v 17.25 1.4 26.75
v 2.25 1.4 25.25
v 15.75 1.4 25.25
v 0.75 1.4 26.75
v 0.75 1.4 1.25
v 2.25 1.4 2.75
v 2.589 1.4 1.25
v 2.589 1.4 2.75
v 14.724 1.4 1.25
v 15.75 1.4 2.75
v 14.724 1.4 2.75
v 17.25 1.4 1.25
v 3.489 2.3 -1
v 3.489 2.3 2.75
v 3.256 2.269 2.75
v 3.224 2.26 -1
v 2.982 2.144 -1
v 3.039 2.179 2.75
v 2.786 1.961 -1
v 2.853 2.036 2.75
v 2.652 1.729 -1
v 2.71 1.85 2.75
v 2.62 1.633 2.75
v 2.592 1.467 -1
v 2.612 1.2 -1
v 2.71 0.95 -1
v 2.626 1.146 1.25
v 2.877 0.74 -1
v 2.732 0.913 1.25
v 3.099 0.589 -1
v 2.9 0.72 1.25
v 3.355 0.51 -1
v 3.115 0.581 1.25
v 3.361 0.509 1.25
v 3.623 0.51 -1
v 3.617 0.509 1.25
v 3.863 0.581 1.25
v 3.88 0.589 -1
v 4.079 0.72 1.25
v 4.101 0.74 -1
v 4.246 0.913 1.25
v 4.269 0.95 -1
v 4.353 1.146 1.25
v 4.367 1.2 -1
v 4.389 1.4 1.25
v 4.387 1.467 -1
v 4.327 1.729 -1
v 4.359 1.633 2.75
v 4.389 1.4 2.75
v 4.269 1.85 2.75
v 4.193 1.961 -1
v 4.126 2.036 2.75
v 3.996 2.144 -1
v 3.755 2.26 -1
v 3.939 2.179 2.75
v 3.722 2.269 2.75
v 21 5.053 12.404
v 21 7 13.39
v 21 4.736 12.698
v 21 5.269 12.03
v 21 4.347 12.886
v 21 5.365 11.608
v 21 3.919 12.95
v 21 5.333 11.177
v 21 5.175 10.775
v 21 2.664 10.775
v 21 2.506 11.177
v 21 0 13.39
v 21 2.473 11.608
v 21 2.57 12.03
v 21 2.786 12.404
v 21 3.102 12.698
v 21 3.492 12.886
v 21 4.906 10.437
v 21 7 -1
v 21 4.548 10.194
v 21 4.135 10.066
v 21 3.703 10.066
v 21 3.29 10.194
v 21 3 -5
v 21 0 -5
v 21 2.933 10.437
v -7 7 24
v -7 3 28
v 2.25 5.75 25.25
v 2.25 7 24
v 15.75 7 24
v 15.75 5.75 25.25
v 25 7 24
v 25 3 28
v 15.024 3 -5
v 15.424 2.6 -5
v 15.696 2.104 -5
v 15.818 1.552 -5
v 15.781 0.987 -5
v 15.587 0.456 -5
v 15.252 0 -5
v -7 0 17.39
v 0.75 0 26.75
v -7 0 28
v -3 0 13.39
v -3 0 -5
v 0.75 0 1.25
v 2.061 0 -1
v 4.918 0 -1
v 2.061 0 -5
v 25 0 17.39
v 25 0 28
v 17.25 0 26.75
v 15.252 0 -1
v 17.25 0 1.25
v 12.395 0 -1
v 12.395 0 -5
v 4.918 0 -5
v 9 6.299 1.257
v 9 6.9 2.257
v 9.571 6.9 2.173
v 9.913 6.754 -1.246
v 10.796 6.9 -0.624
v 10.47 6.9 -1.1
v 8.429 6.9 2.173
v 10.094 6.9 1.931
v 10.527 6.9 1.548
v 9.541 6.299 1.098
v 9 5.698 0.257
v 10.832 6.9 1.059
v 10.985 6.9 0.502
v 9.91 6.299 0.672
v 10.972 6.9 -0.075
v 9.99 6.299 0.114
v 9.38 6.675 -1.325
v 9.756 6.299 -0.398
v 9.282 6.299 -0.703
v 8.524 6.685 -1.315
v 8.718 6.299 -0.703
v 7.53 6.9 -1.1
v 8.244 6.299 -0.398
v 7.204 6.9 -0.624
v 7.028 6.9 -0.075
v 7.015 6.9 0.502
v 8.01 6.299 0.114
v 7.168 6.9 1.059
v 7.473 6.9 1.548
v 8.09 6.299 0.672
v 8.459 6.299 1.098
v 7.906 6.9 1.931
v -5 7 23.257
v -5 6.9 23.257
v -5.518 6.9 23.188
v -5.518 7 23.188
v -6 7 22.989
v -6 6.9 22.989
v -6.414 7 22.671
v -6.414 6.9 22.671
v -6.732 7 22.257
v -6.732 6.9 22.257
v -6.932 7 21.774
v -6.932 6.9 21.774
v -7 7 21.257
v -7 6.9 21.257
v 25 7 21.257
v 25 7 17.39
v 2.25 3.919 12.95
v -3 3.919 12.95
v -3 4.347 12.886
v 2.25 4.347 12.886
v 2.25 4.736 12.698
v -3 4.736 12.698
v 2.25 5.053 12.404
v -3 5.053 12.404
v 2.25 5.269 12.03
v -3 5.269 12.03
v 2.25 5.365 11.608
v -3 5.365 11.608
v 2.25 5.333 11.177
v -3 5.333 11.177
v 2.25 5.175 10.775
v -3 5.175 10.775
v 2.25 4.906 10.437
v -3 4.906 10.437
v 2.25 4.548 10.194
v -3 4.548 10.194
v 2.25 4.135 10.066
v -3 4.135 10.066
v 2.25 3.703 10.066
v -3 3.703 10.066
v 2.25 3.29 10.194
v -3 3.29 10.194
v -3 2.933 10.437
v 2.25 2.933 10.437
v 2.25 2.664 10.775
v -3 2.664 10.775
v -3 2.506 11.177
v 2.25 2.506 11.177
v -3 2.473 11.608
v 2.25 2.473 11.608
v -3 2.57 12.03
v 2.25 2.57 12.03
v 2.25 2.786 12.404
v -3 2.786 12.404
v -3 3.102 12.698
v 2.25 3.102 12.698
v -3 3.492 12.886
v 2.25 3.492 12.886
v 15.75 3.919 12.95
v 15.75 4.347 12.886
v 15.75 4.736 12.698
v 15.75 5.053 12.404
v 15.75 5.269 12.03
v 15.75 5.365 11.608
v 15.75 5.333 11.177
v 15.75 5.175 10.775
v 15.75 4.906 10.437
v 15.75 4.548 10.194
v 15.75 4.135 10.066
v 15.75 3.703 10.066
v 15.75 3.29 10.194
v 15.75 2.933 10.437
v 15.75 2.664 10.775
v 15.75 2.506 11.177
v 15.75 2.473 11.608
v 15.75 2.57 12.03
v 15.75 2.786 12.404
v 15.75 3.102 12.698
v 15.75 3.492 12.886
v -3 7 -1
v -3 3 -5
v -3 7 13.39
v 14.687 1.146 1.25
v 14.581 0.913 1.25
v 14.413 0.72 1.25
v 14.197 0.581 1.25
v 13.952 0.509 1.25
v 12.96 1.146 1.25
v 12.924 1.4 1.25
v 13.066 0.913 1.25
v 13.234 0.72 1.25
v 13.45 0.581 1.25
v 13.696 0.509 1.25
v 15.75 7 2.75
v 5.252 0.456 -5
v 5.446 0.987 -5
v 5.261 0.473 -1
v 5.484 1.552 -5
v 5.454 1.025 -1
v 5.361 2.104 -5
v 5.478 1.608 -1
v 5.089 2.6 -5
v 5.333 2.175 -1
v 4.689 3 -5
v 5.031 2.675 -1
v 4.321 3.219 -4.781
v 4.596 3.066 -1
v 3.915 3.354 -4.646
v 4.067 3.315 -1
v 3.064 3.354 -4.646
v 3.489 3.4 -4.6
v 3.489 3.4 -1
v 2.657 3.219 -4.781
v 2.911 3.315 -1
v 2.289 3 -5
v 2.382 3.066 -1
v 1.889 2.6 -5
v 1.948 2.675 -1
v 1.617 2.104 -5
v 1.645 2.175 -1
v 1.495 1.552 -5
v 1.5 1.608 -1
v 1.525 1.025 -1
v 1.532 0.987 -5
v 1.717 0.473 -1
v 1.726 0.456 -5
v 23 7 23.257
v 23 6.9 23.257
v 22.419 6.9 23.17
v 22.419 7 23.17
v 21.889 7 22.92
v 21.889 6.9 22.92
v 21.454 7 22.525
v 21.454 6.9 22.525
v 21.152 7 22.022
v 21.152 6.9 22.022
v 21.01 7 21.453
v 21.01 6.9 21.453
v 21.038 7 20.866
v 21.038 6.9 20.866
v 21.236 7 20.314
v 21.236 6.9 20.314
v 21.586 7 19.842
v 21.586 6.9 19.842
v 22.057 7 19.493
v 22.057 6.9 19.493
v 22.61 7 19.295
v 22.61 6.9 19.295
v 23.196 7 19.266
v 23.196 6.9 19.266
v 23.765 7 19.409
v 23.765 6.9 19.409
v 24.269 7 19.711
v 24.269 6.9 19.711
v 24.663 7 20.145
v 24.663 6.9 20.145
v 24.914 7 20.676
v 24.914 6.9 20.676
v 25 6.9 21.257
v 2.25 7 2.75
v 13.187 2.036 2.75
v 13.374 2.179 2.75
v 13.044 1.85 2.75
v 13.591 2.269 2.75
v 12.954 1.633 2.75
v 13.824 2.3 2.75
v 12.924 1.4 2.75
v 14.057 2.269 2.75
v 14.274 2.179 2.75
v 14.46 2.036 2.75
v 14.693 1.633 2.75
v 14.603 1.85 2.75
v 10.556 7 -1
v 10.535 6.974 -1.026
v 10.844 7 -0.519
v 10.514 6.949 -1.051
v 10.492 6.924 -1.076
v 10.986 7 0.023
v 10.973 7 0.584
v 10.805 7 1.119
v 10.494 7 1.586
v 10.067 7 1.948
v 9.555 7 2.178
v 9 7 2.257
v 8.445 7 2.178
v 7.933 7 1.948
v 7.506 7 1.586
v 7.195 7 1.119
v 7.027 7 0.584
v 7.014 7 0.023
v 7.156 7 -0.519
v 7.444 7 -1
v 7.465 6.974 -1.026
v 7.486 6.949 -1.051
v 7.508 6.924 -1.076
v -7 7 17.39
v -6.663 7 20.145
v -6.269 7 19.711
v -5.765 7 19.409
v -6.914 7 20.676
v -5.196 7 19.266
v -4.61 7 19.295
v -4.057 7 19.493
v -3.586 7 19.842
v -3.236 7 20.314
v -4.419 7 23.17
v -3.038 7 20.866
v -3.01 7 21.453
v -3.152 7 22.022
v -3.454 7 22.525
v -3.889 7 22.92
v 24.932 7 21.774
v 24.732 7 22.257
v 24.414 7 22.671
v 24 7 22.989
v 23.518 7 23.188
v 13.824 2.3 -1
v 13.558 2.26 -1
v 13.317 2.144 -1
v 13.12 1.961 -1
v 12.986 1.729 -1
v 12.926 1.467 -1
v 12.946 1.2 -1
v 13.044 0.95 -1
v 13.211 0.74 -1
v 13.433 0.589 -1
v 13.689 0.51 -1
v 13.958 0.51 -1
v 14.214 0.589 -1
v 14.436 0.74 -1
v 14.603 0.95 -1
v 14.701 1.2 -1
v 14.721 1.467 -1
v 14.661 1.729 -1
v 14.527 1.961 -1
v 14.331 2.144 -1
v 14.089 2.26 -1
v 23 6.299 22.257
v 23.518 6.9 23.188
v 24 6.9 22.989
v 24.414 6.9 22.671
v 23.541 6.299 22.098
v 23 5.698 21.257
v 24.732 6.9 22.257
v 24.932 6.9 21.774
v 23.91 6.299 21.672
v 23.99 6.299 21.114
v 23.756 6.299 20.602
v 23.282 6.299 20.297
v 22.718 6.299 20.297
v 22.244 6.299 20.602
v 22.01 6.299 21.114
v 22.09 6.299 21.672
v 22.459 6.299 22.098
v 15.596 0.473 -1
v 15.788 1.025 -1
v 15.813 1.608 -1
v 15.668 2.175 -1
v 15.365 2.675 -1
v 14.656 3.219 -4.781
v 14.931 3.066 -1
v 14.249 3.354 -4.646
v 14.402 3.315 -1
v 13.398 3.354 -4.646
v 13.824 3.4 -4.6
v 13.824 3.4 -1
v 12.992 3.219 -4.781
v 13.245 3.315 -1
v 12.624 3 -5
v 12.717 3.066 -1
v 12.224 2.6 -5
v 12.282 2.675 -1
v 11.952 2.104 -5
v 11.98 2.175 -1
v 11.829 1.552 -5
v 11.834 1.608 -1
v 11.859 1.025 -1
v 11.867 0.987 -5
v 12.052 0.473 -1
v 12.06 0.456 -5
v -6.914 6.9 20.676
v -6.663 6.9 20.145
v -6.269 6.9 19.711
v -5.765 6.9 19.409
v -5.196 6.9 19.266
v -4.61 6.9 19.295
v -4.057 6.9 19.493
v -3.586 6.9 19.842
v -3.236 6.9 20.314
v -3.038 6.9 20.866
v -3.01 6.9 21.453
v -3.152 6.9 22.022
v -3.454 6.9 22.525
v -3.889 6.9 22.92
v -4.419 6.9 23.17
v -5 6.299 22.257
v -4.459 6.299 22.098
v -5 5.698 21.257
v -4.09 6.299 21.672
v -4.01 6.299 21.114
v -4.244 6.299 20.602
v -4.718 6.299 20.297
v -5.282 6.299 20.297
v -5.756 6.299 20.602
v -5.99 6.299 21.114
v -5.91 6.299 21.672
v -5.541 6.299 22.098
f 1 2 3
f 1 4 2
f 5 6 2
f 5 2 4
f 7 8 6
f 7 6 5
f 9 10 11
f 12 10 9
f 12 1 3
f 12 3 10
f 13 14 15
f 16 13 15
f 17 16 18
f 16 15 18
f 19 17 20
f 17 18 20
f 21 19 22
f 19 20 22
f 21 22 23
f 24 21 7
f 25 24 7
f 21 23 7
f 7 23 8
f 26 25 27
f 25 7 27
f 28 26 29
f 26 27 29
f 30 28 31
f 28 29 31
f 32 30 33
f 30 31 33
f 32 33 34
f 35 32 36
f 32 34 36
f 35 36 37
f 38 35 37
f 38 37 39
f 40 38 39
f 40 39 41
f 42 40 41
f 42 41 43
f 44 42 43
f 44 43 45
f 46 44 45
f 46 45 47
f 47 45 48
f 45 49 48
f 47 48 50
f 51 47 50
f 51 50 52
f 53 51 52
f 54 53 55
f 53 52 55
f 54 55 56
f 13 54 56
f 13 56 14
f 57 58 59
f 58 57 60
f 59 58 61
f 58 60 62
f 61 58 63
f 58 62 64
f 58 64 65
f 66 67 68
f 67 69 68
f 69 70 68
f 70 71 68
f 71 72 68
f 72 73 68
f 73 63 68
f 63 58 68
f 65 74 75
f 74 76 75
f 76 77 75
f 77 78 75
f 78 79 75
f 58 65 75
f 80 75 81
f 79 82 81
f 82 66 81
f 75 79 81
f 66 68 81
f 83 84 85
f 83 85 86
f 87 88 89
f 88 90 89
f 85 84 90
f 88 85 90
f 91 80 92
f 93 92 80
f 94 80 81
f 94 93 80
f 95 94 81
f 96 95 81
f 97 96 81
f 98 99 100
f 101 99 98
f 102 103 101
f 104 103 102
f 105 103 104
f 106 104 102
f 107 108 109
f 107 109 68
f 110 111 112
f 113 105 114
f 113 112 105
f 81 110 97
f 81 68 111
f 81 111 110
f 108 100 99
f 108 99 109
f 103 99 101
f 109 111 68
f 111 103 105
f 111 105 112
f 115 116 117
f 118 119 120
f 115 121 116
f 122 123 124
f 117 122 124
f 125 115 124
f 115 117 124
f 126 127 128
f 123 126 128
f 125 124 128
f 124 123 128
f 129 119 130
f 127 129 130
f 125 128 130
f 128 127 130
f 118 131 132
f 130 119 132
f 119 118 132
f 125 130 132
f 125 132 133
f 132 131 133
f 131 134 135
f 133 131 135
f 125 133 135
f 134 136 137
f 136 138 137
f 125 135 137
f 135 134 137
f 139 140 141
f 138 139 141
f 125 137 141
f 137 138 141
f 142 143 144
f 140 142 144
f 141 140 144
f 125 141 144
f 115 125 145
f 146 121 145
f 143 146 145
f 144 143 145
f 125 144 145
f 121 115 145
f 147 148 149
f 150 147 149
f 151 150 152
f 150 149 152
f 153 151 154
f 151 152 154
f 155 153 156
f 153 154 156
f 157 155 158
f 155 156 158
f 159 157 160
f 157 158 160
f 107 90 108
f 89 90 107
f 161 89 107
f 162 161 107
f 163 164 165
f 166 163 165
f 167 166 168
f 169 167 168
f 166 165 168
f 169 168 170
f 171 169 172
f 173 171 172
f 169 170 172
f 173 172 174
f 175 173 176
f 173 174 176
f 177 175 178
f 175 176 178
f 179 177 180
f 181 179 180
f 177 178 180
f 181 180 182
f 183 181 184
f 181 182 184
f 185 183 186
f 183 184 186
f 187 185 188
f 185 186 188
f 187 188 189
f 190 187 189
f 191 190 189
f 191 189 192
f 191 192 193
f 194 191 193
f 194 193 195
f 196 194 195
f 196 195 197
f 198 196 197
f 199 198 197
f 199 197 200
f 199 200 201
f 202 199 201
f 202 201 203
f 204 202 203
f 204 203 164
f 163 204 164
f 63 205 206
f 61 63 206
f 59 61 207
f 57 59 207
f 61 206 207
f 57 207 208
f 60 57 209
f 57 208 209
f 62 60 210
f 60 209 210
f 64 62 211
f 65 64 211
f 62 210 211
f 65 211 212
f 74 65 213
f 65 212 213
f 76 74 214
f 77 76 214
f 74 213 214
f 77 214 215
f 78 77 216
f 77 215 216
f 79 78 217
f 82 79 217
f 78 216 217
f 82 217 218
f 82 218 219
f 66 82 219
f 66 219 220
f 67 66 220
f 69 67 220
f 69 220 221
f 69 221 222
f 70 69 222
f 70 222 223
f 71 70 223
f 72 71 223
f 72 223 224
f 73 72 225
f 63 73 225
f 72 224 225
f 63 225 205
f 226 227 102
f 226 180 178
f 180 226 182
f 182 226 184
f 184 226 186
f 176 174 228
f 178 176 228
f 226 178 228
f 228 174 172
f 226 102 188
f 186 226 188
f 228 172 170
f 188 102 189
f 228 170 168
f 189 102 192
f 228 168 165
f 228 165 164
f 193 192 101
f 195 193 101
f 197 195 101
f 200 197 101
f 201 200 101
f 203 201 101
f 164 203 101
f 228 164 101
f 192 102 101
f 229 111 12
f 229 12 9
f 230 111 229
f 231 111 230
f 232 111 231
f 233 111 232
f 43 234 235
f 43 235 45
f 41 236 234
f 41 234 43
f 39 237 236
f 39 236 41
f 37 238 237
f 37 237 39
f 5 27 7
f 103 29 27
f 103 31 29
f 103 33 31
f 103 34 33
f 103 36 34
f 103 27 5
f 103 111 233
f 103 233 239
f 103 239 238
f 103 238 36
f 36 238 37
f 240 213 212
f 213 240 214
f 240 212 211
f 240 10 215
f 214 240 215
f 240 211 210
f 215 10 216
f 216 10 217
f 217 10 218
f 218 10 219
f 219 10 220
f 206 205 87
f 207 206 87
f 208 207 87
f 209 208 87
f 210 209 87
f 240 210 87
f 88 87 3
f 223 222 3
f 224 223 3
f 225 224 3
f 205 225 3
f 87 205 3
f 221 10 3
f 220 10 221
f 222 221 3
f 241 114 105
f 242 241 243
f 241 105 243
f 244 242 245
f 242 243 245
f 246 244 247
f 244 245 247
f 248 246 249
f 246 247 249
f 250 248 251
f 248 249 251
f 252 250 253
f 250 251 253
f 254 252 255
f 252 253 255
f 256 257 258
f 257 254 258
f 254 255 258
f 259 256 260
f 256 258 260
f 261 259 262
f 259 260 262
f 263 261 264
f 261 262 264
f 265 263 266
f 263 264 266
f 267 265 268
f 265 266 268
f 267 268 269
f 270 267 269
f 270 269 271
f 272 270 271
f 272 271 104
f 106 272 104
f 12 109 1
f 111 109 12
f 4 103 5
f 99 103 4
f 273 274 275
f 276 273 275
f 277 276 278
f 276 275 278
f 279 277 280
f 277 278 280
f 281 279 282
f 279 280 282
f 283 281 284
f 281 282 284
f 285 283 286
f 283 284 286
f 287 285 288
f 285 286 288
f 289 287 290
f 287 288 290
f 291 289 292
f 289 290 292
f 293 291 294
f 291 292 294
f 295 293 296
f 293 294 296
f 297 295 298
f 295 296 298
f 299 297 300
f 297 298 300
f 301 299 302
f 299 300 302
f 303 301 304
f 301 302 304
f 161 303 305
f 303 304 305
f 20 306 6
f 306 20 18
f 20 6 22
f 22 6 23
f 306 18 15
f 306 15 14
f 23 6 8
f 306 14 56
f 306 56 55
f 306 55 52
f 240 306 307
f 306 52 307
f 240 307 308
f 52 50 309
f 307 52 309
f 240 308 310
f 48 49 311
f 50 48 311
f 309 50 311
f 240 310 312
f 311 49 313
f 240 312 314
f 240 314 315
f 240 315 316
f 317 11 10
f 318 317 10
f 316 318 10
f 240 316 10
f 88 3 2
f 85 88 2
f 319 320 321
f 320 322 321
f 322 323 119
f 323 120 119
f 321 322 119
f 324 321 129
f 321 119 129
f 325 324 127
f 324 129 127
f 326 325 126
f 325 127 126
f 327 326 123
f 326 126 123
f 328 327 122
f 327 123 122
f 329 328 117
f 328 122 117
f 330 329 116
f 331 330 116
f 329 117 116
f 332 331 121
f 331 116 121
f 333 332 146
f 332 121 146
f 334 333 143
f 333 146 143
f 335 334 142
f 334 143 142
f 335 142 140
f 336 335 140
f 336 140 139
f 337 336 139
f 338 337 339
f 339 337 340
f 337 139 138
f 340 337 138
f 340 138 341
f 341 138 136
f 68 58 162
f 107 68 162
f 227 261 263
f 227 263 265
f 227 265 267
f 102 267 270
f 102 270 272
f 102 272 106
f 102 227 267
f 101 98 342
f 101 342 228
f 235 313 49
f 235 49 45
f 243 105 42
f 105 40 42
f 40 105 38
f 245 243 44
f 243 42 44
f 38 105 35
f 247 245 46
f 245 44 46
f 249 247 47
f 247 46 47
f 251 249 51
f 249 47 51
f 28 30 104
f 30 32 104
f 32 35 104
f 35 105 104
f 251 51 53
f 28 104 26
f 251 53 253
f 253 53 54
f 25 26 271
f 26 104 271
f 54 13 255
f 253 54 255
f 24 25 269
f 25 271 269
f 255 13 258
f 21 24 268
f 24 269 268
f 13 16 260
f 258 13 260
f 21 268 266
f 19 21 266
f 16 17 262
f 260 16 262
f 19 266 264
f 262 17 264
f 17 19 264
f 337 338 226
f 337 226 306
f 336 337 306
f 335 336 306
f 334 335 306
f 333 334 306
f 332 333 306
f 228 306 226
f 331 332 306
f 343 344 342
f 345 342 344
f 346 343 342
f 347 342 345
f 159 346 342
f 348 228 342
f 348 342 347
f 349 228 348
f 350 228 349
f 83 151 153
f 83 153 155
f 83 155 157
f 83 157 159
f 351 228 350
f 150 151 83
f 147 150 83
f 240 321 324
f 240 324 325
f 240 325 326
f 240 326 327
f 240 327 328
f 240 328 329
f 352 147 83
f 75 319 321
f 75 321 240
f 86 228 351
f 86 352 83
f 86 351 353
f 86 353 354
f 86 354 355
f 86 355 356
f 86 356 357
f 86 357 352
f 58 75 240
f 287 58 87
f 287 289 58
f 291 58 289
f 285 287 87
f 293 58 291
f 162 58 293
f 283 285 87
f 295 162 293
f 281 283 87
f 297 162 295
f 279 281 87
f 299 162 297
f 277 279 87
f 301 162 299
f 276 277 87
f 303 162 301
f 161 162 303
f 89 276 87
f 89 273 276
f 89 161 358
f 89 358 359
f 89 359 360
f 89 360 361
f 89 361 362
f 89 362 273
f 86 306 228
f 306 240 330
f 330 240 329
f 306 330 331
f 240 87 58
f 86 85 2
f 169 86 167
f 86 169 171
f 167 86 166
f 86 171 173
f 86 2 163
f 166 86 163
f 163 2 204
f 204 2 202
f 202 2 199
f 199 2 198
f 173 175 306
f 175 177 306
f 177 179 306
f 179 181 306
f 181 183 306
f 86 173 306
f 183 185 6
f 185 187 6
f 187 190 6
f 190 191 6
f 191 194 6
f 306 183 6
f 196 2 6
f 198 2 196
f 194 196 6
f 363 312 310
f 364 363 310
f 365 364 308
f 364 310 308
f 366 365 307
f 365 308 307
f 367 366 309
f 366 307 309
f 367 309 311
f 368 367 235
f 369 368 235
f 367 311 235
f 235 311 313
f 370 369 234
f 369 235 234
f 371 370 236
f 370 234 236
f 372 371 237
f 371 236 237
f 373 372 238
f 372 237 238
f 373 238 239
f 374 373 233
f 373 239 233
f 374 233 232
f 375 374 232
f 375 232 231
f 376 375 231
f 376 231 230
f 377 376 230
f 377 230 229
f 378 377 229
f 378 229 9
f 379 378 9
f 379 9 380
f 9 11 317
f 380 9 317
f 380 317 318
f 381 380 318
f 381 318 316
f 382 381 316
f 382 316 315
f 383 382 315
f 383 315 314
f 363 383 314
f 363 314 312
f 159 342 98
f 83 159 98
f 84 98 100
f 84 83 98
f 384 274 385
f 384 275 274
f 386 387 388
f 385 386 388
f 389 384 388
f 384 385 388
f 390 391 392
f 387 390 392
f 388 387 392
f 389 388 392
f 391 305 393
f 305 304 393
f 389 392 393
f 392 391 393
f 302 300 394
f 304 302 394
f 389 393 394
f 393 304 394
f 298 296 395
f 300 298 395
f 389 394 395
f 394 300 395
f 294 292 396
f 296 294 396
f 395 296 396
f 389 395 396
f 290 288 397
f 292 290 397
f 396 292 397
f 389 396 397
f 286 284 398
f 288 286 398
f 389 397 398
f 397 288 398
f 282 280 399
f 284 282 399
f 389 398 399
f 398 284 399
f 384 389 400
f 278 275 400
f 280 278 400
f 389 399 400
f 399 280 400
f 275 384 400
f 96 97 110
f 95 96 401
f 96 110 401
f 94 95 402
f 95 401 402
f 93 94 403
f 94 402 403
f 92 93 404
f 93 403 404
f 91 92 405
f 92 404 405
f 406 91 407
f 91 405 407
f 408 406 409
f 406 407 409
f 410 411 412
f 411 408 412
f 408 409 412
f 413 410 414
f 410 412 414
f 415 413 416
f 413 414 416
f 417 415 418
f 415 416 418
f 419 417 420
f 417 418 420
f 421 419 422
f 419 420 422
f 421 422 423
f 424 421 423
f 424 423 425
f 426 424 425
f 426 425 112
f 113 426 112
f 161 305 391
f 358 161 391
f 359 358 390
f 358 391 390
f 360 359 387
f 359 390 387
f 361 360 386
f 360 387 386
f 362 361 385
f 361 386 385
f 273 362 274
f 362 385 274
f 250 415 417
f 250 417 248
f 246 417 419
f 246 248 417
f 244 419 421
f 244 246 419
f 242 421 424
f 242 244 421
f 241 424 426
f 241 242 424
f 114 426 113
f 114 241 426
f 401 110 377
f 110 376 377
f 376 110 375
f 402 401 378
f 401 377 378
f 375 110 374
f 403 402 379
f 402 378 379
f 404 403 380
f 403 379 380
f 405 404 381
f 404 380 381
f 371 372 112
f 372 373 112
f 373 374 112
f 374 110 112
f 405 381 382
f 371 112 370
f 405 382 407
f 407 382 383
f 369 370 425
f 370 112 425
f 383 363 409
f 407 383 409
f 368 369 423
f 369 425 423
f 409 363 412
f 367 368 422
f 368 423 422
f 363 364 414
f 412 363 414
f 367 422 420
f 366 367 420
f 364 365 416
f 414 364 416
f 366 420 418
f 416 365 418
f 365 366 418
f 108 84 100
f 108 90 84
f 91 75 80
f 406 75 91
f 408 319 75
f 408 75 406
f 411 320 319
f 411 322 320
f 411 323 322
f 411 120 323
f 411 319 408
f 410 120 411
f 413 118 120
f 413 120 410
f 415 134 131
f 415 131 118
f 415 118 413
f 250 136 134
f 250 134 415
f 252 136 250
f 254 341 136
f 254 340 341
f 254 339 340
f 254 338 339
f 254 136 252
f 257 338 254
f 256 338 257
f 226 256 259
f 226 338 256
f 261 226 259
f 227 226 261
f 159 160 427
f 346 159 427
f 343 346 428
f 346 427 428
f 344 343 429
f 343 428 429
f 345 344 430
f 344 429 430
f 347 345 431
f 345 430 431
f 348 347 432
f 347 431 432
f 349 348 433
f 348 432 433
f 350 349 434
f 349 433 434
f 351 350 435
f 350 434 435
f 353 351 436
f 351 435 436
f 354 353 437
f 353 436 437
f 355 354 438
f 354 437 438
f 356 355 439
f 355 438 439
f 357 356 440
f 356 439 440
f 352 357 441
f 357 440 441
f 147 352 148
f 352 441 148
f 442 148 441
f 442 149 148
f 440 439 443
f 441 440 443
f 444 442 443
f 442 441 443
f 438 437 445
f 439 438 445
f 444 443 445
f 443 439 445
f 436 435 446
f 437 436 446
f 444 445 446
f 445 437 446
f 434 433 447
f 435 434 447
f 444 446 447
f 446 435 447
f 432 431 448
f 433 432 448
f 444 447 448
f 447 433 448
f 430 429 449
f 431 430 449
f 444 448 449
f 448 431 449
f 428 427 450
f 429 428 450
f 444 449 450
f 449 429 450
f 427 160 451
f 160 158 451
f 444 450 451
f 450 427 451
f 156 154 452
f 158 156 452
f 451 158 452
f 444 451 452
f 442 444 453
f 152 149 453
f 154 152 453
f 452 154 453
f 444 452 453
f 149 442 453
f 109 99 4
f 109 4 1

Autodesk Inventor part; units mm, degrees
ref_plane "YZ Plane" through (0, 0, 0) normal (1, 0, 0) x (0, 1, 0)
ref_plane "XZ Plane" through (0, 0, 0) normal (0, 1, 0) x (-1, 0, 0)
ref_plane "XY Plane" through (0, 0, 0) normal (0, 0, 1) x (1, 0, 0)
sketch "Skizze1" plane through (0, 0, 0) normal (0, 1, 0) x (-1, 0, 0)
  line L0 (0, 0) -> (-18, 0)
  line L1 (-18, 0) -> (-18, 28)
  line L2 (-18, 28) -> (0, 28)
  line L3 (0, 28) -> (0, 0)
  dimension "d0" = 18
  dimension "d1" = 28
extrude "Extrusion1" add sketch "Skizze1" along normal blind 7
sketch "Skizze2" plane through (18, 0, 28) normal (0, -1, 0) x (0, 0, -1)
  line L0 (0, -18) -> (0, 0) projected
  line L1 (28, -18) -> (0, -18) projected
  line L2 (28, 0) -> (28, -18) projected
  line L3 (0, 0) -> (28, 0) projected
  line L4 (26.75, -17.25) -> (1.25, -17.25)
  line L5 (1.25, -17.25) -> (1.25, -0.75)
  line L6 (1.25, -0.75) -> (26.75, -0.75)
  line L7 (26.75, -0.75) -> (26.75, -17.25)
  line L8 (26.75, -17.25) -> (1.25, -0.75) construction
  line L9 (1.25, -17.25) -> (26.75, -0.75) construction
  point P0 (14, -9)
  dimension "d16" = 25.5
  dimension "d17" = 16.5
extrude "Extrusion2" cut sketch "Skizze2" against normal blind 1.4 contours L4 L5 L6 L7
sketch "Skizze5" plane through (18, 1.4, 28) normal (0, -1, 0) x (1, 0, 0)
  line L0 (-0.75, -1.25) -> (-0.75, -26.75) projected
  line L1 (-17.25, -1.25) -> (-0.75, -1.25) projected
  line L2 (-17.25, -26.75) -> (-17.25, -1.25) projected
  line L3 (-0.75, -26.75) -> (-17.25, -26.75) projected
  line L4 (-2.25, -25.25) -> (-2.25, -2.75)
  line L5 (-2.25, -2.75) -> (-15.75, -2.75)
  line L6 (-15.75, -2.75) -> (-15.75, -25.25)
  line L7 (-15.75, -25.25) -> (-2.25, -25.25)
  point P0 (-18, -28)
  dimension "d18" = 1.5
extrude "Extrusion5" cut sketch "Skizze5" against normal blind 6 contours L7 L6 L5 L4
ref_plane "Arbeitsebene2" through (9, 0, 0) normal (-0.7071068, 0, -0.7071068) x (0, 1, 0)
ref_plane "Arbeitsebene1" through (9, 0, 0) normal (-1, 0, 0) x (0, 0, 1)
ref_plane "Arbeitsebene3" through (0, 0, 14) normal (0, 0, 1) x (1, 0, 0)
sketch "Skizze6" plane through (0, 0, 0) normal (-1, 0, 0) x (0, 0, 1)
  line L0 (0, 7) -> (28, 7) projected
  line L1 (0, 0) -> (0, 7) projected
  line L2 (0, 0) -> (28, 0) projected
  line L3 (28, 0) -> (28, 7) projected
  line L4 (0, 7) -> (-5, 7)
  line L5 (-5, 7) -> (-5, 0)
  line L6 (-5, 0) -> (0, 0)
  line L7 (0, 0) -> (0, 7)
  dimension "d24" = 5
extrude "Extrusion6" add sketch "Skizze6" against normal up to surface (18 mm away) contours L1 L6 L5 L4
ref_plane "Arbeitsebene4" through (-15.85, 34.426, 14.0849) normal (0, 0.7071068, -0.7071068) x (1, 0, 0)
sketch "Skizze7" plane through (-15.85, 34.426, 14.0849) normal (0, 0.7071068, -0.7071068) x (1, 0, 0)
  point P0 (15.85, 34.3024)
sketch "Skizze8" plane through (0, 0, 0) normal (0, -1, 0) x (1, 0, 0)
  line L0 (0.75, 26.75) -> (17.25, 26.75) projected
  line L1 (17.25, 26.75) -> (17.25, 1.25) projected
  line L2 (17.25, 1.25) -> (0.75, 1.25) projected
  line L3 (0.75, 1.25) -> (0.75, 26.75) projected
  line L4 (0, 28) -> (18, 28) projected
  line L5 (18, 28) -> (18, -5) projected
  line L6 (0, -5) -> (0, 28) projected
  line L7 (0, -5) -> (-3, -5)
  line L8 (-3, -5) -> (-3, 28)
  line L9 (-3, 28) -> (0, 28)
  line L10 (0, 28) -> (0, -5)
  line L11 (18, 28) -> (18, -5) projected
  line L12 (18, 28) -> (21, 28)
  line L13 (21, 28) -> (21, -5)
  line L14 (21, -5) -> (18, -5)
  line L15 (18, -5) -> (18, 28)
  line L16 (0, -5) -> (0, 28) projected
  line L17 (0, -5) -> (18, -5) projected
  point P0 (0, 0)
  dimension "d27" = 3
  dimension "d28" = 3
extrude "Extrusion7" add sketch "Skizze8" against normal blind 7 contours L6 L7 L8 L9 | L12 L13 L14 L5
ref_plane "Arbeitsebene5" through (21, -5.7279, 12.7279) normal (0, 0.7071068, -0.7071068) x (-1, 0, 0)
sketch "Skizze10" plane through (-3, 0, -5) normal (-1, 0, 0) x (0, 0, 1)
  line L0 (0, 7) -> (33, 7) projected
  line L1 (0, 0) -> (0, 7) projected
  line L2 (33, 0) -> (0, 0) projected
  line L3 (33, 0) -> (33, 7) projected
  circle A0 centre (16.5, 3.9193) radius 1.45
  point P0 (5, 0)
  dimension "d38" = 2.9
extrude "Extrusion9" cut sketch "Skizze10" against normal through all contours A0
ref_plane "Arbeitsebene6" through (21, -1.4853, 8.4853) normal (0, 0.7071068, -0.7071068) x (-1, 0, 0)
sketch "Skizze14" plane through (21, 0, -5) normal (0, 0, -1) x (-1, 0, 0)
  line L0 (24, 0) -> (0, 0) projected
  line L1 (3.75, 1.4) -> (20.25, 1.4) projected
  circle A0 centre (17.5107, 1.4) radius 0.9
  circle A1 centre (7.1764, 1.4) radius 1.0097
  point P0 (21, 0)
  dimension "d55" = 1.8
hole "Bohrung3" at (3.4893, 1.4, -5) at (13.8236, 1.4, -5) direction (0, 0, 1) diameter 1.8 depth 10 tip angle 118 counterbore diameter 4 counterbore depth 4
sketch "Skizze15" plane through (21, 0, 28) normal (1, 0, 0) x (0, 0, -1)
  circle A0 centre (16.5, 3.9193) radius 1.45 projected
  line L0 (0, 7) -> (33, 7) projected
  line L1 (0, 0) -> (0, 7) projected
  line L2 (33, 0) -> (0, 0) projected
  line L3 (33, 0) -> (33, 7) projected
  line L4 (25.25, 7) -> (5, 7) projected
  line L5 (10.6096, 7) -> (10.6096, 0)
  point P0 (28, 0)
extrude "Extrusion10" add sketch "Skizze15" along normal blind 4 contours L0 L5 L2 L1
sketch "Skizze16" plane through (-3, 0, -5) normal (-1, 0, 0) x (0, 0, 1)
  line L0 (33, 7) -> (33, 0) projected
  line L1 (33, 0) -> (22.3904, 0) projected
  line L2 (22.3904, 0) -> (22.3904, 7) projected
  line L3 (22.3904, 7) -> (33, 7) projected
  point P0 (5, 0)
extrude "Extrusion11" add sketch "Skizze16" along normal blind 4
sketch "Skizze13" plane through (21, 7, 8.4853) normal (0, 1, 0) x (-1, 0, 0)
  circle A0 centre (-2, 12.7713) radius 2.45 projected
  circle A1 centre (26, 12.7713) radius 2.45 projected
  circle A2 centre (12, -8.2287) radius 2.75 projected
  point P0 (21, -4.9497)
  point P1 (12, -10.2287)
hole "Bohrung2" at (23, 7, 21.2566) at (-5, 7, 21.2566) at (9, 7, 0.2566) direction (0, -1, 0) diameter 4 depth 0.1 tip angle 118
chamfer "Fase3" distance 4 angle 45 4 edges at (21, 3.5, 17.3904) (-3, 3.5, 17.3904) (9, 7, 28) (9, 7, -5)
properties part number "20_Cube_Insert_Fibercombiner_FPC_filtermount_v3"
